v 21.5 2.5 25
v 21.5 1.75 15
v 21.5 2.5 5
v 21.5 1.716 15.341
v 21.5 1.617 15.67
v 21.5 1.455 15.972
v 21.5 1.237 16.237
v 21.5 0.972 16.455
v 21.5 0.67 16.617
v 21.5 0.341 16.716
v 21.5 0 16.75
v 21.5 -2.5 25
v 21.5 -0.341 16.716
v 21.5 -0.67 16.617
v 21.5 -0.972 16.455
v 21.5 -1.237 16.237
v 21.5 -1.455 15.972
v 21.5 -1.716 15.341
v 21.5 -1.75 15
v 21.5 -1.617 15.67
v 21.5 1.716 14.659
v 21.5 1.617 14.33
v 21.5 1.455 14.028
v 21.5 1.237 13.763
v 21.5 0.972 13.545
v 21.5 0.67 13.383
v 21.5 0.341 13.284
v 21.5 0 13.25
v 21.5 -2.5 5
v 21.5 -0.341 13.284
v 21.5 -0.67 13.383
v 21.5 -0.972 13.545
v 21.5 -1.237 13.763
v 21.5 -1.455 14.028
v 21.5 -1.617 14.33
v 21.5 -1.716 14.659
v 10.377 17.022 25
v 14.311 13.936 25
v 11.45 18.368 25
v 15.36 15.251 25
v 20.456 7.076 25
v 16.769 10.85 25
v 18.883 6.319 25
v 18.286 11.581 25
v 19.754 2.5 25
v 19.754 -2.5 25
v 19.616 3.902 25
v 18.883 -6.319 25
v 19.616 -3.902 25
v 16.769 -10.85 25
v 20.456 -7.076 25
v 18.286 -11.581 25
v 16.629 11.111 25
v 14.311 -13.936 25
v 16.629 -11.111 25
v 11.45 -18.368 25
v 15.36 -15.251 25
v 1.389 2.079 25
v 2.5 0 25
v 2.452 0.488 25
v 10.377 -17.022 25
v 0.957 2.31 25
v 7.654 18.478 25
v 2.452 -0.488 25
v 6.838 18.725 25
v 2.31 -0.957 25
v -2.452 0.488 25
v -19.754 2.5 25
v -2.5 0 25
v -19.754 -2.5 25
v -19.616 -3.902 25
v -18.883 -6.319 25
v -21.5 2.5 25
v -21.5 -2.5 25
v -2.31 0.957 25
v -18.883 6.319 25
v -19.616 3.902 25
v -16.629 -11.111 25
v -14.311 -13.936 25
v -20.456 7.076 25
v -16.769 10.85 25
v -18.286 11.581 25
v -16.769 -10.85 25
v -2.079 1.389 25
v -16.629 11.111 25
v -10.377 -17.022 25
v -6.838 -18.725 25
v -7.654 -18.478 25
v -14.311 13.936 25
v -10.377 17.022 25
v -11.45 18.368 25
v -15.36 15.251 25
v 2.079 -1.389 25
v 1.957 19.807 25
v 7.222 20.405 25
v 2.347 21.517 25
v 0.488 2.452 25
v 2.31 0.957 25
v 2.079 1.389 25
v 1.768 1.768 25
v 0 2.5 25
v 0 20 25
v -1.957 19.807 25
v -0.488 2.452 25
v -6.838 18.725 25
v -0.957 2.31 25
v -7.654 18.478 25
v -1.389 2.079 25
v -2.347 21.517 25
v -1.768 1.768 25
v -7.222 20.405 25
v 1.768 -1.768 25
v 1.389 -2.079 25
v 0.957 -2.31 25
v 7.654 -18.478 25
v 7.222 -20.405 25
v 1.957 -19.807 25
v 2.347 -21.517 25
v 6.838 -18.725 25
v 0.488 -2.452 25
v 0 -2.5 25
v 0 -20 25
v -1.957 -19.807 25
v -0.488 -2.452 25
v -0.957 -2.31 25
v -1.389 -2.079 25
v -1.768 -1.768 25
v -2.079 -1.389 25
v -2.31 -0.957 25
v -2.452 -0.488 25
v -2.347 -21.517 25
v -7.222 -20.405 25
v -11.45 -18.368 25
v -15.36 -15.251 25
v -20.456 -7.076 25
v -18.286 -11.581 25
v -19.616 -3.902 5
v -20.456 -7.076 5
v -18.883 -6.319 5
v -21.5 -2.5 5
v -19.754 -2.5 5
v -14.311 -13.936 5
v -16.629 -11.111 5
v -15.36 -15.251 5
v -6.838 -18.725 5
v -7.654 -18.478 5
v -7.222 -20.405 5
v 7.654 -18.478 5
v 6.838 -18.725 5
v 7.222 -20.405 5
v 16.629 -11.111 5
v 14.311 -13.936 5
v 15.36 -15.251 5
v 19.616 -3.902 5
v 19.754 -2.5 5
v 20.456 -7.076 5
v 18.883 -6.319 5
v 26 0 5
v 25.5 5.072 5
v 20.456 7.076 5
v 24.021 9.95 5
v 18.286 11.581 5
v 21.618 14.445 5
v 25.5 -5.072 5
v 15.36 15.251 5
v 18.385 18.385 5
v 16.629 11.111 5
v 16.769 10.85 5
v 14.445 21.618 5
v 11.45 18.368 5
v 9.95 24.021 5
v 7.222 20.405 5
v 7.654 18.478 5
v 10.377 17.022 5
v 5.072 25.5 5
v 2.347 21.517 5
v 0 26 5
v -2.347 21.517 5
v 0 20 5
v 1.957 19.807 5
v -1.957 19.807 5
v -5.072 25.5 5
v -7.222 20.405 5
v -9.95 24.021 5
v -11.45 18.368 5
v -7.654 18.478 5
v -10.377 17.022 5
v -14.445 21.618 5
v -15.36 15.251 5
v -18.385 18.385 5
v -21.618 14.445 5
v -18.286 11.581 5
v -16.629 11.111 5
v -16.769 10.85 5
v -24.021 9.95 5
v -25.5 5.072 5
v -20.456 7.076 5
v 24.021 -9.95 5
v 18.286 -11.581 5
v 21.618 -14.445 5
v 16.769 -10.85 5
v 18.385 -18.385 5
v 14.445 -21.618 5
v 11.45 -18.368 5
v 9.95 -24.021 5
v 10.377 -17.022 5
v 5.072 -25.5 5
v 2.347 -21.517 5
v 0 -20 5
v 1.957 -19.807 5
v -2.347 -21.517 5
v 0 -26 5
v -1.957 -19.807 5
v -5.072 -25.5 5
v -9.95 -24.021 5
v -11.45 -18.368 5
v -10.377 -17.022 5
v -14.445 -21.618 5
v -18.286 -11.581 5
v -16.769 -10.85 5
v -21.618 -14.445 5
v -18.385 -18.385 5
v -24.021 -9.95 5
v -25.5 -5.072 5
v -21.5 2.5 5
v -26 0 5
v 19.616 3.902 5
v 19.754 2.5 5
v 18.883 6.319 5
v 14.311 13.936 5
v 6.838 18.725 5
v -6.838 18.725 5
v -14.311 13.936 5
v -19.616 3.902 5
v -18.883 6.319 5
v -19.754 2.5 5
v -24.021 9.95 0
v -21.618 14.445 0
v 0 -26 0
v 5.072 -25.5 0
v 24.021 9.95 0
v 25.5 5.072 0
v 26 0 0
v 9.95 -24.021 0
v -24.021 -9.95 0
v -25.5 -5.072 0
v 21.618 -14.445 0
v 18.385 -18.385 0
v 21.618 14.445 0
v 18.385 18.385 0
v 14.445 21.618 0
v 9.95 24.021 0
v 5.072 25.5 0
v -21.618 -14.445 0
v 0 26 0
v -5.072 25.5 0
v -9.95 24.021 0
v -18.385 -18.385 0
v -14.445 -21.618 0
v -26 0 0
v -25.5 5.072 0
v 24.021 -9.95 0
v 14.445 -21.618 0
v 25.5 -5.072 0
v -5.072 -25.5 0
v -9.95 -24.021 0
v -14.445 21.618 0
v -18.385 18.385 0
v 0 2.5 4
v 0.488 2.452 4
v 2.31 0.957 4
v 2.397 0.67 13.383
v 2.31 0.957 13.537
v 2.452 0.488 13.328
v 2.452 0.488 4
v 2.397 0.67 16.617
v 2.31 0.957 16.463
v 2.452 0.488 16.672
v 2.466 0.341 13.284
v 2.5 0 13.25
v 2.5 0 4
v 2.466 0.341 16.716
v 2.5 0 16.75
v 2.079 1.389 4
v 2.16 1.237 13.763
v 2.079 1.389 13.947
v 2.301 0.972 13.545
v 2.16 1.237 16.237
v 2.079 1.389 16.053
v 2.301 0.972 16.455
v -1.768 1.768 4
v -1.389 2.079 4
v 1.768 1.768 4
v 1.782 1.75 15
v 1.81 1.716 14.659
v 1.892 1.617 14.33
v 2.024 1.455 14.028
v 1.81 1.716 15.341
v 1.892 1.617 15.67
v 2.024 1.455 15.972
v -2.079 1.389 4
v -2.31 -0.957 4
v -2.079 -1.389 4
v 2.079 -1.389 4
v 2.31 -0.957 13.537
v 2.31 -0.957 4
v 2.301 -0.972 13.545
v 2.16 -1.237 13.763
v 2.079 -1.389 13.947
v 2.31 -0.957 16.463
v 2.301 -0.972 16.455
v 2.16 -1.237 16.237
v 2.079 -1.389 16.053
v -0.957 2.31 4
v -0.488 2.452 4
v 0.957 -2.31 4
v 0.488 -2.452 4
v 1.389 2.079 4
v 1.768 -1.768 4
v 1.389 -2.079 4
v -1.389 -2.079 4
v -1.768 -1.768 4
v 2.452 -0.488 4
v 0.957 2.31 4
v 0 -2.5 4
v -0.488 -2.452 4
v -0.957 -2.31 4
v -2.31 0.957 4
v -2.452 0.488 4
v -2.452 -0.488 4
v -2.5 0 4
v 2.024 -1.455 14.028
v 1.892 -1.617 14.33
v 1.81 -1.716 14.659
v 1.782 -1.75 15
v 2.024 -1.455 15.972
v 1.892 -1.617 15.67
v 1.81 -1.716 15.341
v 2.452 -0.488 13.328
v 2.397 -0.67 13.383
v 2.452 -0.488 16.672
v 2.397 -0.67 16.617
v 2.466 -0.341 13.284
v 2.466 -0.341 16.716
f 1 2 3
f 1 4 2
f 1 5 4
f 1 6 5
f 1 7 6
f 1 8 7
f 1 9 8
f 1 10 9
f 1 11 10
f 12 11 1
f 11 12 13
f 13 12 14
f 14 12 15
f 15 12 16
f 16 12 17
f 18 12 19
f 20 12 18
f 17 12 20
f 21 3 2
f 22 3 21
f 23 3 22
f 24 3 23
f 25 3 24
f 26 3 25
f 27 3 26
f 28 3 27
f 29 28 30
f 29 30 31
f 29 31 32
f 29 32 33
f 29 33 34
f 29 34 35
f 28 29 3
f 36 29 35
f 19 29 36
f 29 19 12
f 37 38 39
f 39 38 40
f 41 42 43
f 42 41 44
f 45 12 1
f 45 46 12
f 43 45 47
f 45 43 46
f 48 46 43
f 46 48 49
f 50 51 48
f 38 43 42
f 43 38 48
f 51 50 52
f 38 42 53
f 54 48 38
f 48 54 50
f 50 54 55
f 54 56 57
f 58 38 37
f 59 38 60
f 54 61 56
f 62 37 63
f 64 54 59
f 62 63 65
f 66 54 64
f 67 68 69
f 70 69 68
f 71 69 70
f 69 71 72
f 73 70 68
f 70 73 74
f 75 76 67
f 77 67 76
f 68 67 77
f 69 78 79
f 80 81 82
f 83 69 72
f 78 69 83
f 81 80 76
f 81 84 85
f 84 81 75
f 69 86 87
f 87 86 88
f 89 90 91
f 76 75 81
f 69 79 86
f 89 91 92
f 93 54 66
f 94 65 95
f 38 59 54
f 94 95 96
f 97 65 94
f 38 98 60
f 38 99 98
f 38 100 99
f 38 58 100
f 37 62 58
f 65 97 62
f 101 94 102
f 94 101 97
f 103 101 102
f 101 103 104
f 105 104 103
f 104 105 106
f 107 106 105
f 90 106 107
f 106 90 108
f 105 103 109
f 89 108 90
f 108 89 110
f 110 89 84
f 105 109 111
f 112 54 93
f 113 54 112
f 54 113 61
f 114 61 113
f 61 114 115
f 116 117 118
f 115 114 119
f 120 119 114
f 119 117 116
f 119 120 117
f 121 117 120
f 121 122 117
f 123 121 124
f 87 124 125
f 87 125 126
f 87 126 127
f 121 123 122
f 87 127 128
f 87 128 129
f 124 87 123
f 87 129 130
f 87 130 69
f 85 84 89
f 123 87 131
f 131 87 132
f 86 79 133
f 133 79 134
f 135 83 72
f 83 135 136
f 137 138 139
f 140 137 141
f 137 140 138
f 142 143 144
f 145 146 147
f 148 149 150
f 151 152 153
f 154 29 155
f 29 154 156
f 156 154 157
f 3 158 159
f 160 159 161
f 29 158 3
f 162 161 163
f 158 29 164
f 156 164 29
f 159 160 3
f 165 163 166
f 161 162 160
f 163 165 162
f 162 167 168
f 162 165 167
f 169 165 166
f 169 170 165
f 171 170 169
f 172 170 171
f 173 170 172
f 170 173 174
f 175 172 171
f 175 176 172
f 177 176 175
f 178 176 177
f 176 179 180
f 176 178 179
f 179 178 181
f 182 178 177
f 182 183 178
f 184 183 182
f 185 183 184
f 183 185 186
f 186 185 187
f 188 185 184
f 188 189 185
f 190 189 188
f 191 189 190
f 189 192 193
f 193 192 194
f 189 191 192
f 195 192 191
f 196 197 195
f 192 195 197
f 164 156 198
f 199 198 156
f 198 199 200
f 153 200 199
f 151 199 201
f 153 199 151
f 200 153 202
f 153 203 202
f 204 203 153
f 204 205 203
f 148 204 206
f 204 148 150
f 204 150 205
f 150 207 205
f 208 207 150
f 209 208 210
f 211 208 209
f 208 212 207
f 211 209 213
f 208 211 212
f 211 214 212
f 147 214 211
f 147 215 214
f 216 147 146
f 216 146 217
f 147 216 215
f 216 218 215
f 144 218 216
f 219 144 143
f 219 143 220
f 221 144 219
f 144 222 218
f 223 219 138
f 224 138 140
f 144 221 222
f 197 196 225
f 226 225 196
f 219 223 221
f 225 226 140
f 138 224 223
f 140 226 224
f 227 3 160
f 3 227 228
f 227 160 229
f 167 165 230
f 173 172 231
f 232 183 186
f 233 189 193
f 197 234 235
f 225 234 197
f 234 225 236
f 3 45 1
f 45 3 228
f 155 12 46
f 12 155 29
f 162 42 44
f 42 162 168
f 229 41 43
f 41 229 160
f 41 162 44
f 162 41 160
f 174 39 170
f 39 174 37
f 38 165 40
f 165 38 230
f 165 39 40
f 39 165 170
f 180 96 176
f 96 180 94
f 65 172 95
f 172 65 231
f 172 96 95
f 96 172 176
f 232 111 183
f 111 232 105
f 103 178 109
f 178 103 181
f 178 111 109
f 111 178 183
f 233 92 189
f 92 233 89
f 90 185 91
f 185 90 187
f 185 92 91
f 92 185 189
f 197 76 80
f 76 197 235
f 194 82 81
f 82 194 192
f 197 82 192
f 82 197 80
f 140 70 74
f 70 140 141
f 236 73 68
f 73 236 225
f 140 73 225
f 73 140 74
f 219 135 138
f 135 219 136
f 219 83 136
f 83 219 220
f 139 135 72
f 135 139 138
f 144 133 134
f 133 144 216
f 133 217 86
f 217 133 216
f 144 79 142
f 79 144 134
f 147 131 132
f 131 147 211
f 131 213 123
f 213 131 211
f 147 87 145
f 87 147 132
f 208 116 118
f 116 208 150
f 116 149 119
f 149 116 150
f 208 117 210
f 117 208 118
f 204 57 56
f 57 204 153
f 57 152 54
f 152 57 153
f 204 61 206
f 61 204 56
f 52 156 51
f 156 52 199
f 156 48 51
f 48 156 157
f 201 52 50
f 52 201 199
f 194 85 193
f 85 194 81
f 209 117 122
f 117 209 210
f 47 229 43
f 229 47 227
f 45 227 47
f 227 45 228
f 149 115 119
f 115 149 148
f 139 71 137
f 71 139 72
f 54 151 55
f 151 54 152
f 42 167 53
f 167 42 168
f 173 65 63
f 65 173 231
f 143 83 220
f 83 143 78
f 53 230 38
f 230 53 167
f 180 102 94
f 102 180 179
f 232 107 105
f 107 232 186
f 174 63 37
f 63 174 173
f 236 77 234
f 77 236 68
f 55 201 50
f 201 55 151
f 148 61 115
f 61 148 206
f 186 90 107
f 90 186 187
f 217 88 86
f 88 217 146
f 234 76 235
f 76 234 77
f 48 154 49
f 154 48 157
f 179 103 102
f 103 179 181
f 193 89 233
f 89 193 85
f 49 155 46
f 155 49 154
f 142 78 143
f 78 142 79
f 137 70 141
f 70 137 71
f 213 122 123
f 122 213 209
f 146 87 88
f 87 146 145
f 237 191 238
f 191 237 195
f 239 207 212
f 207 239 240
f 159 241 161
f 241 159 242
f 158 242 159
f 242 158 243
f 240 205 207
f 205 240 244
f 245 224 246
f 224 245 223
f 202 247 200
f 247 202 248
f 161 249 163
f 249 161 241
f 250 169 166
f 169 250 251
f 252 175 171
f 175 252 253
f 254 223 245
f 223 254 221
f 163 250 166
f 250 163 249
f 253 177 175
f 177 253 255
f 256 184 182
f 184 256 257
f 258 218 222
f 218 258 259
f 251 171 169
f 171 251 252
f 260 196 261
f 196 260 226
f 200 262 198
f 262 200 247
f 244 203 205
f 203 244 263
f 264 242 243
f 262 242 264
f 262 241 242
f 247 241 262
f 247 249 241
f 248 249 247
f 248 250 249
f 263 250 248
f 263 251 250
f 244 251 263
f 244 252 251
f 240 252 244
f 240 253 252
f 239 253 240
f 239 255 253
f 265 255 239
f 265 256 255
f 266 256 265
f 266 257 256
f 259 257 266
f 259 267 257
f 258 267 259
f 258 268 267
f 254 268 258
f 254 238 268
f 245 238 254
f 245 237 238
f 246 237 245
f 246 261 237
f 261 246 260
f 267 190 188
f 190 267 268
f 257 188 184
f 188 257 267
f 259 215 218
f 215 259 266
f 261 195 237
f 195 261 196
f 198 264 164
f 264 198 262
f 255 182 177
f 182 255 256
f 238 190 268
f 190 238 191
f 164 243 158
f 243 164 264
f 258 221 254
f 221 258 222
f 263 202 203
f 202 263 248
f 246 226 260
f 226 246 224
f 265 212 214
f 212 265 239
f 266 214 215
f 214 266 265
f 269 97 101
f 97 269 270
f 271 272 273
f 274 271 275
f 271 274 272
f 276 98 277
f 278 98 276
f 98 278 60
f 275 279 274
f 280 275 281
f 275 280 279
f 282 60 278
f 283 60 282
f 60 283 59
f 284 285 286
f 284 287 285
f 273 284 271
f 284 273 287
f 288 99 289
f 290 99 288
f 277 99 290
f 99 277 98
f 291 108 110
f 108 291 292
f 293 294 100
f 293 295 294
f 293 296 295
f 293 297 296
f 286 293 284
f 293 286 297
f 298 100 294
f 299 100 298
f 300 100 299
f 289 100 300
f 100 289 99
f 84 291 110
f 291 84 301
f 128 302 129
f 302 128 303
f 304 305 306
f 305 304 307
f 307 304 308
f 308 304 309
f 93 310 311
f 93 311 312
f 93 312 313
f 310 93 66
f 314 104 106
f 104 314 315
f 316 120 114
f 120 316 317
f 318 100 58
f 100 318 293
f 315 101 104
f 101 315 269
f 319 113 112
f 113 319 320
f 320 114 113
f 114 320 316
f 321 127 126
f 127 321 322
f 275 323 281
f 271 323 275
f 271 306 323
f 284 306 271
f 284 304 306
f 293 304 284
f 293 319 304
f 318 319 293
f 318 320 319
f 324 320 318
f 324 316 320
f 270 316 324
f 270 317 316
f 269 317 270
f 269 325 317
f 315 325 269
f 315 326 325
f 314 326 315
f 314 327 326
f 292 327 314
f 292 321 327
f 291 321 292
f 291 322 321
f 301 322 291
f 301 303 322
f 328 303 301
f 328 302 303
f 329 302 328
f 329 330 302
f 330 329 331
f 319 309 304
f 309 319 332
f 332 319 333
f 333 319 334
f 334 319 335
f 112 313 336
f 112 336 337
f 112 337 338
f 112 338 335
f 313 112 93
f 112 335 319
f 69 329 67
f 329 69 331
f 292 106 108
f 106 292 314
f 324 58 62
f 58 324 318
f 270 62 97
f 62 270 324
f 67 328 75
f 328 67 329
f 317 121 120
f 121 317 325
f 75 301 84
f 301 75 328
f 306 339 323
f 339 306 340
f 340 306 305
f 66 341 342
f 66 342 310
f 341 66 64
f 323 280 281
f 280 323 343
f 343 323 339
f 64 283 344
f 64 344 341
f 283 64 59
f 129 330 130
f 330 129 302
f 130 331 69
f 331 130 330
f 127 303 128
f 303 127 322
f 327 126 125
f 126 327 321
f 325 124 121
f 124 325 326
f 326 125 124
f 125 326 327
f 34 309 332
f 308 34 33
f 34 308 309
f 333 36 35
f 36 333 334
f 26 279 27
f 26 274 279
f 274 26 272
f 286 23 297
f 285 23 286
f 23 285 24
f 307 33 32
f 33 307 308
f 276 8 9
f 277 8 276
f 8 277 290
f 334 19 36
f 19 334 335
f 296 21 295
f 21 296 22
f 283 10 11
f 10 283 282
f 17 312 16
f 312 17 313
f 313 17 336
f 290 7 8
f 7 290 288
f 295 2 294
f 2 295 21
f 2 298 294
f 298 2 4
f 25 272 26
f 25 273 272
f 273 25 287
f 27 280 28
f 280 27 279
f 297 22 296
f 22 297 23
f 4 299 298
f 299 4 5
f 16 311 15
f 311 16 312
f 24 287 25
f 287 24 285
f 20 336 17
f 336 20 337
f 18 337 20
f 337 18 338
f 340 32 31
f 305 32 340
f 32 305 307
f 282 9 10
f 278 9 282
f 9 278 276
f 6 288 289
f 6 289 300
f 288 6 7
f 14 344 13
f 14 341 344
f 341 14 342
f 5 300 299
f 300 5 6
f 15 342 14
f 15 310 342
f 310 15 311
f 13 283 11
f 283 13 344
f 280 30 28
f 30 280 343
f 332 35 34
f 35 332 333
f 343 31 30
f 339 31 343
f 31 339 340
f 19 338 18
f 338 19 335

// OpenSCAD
$fn = 32;

// ----------------------------------------------------------------------
// Control knob: skirt knob with grip ribs
// ----------------------------------------------------------------------

// --- parameters (mm) ---
skirt_d = 52;             // skirt diameter
skirt_t = 5;              // skirt thickness
rib_w = 5;                // grip rib width
rib_out = 2.5;            // grip rib radial protrusion
n_ribs = 14;              // number of grip ribs
knob_d = 40;              // knob body diameter
knob_h = 20;              // knob body height
bore_d = 5;               // shaft bore diameter
set_d = 3.5;              // set screw bore diameter

rib_step = 360 / n_ribs;  // rib angular step
total_h = skirt_t + knob_h;  // overall height

difference() {
  union() {
    translate([0, 0, skirt_t]) cylinder(h = knob_h, d = knob_d);
    cylinder(h = skirt_t, d = skirt_d);
    for (i = [0 : n_ribs - 1])
      rotate([0, 0, i * rib_step])
        translate([knob_d / 2 - 1, -rib_w / 2, skirt_t])
          cube([rib_out, rib_w, knob_h]);
  }
  translate([0, 0, skirt_t - 1]) cylinder(h = knob_h + 2, d = bore_d);
  translate([-1, 0, skirt_t + knob_h / 2]) rotate([0, 90, 0])
    cylinder(h = knob_d / 2 + bore_d / 2 + 2, d = set_d);
}
